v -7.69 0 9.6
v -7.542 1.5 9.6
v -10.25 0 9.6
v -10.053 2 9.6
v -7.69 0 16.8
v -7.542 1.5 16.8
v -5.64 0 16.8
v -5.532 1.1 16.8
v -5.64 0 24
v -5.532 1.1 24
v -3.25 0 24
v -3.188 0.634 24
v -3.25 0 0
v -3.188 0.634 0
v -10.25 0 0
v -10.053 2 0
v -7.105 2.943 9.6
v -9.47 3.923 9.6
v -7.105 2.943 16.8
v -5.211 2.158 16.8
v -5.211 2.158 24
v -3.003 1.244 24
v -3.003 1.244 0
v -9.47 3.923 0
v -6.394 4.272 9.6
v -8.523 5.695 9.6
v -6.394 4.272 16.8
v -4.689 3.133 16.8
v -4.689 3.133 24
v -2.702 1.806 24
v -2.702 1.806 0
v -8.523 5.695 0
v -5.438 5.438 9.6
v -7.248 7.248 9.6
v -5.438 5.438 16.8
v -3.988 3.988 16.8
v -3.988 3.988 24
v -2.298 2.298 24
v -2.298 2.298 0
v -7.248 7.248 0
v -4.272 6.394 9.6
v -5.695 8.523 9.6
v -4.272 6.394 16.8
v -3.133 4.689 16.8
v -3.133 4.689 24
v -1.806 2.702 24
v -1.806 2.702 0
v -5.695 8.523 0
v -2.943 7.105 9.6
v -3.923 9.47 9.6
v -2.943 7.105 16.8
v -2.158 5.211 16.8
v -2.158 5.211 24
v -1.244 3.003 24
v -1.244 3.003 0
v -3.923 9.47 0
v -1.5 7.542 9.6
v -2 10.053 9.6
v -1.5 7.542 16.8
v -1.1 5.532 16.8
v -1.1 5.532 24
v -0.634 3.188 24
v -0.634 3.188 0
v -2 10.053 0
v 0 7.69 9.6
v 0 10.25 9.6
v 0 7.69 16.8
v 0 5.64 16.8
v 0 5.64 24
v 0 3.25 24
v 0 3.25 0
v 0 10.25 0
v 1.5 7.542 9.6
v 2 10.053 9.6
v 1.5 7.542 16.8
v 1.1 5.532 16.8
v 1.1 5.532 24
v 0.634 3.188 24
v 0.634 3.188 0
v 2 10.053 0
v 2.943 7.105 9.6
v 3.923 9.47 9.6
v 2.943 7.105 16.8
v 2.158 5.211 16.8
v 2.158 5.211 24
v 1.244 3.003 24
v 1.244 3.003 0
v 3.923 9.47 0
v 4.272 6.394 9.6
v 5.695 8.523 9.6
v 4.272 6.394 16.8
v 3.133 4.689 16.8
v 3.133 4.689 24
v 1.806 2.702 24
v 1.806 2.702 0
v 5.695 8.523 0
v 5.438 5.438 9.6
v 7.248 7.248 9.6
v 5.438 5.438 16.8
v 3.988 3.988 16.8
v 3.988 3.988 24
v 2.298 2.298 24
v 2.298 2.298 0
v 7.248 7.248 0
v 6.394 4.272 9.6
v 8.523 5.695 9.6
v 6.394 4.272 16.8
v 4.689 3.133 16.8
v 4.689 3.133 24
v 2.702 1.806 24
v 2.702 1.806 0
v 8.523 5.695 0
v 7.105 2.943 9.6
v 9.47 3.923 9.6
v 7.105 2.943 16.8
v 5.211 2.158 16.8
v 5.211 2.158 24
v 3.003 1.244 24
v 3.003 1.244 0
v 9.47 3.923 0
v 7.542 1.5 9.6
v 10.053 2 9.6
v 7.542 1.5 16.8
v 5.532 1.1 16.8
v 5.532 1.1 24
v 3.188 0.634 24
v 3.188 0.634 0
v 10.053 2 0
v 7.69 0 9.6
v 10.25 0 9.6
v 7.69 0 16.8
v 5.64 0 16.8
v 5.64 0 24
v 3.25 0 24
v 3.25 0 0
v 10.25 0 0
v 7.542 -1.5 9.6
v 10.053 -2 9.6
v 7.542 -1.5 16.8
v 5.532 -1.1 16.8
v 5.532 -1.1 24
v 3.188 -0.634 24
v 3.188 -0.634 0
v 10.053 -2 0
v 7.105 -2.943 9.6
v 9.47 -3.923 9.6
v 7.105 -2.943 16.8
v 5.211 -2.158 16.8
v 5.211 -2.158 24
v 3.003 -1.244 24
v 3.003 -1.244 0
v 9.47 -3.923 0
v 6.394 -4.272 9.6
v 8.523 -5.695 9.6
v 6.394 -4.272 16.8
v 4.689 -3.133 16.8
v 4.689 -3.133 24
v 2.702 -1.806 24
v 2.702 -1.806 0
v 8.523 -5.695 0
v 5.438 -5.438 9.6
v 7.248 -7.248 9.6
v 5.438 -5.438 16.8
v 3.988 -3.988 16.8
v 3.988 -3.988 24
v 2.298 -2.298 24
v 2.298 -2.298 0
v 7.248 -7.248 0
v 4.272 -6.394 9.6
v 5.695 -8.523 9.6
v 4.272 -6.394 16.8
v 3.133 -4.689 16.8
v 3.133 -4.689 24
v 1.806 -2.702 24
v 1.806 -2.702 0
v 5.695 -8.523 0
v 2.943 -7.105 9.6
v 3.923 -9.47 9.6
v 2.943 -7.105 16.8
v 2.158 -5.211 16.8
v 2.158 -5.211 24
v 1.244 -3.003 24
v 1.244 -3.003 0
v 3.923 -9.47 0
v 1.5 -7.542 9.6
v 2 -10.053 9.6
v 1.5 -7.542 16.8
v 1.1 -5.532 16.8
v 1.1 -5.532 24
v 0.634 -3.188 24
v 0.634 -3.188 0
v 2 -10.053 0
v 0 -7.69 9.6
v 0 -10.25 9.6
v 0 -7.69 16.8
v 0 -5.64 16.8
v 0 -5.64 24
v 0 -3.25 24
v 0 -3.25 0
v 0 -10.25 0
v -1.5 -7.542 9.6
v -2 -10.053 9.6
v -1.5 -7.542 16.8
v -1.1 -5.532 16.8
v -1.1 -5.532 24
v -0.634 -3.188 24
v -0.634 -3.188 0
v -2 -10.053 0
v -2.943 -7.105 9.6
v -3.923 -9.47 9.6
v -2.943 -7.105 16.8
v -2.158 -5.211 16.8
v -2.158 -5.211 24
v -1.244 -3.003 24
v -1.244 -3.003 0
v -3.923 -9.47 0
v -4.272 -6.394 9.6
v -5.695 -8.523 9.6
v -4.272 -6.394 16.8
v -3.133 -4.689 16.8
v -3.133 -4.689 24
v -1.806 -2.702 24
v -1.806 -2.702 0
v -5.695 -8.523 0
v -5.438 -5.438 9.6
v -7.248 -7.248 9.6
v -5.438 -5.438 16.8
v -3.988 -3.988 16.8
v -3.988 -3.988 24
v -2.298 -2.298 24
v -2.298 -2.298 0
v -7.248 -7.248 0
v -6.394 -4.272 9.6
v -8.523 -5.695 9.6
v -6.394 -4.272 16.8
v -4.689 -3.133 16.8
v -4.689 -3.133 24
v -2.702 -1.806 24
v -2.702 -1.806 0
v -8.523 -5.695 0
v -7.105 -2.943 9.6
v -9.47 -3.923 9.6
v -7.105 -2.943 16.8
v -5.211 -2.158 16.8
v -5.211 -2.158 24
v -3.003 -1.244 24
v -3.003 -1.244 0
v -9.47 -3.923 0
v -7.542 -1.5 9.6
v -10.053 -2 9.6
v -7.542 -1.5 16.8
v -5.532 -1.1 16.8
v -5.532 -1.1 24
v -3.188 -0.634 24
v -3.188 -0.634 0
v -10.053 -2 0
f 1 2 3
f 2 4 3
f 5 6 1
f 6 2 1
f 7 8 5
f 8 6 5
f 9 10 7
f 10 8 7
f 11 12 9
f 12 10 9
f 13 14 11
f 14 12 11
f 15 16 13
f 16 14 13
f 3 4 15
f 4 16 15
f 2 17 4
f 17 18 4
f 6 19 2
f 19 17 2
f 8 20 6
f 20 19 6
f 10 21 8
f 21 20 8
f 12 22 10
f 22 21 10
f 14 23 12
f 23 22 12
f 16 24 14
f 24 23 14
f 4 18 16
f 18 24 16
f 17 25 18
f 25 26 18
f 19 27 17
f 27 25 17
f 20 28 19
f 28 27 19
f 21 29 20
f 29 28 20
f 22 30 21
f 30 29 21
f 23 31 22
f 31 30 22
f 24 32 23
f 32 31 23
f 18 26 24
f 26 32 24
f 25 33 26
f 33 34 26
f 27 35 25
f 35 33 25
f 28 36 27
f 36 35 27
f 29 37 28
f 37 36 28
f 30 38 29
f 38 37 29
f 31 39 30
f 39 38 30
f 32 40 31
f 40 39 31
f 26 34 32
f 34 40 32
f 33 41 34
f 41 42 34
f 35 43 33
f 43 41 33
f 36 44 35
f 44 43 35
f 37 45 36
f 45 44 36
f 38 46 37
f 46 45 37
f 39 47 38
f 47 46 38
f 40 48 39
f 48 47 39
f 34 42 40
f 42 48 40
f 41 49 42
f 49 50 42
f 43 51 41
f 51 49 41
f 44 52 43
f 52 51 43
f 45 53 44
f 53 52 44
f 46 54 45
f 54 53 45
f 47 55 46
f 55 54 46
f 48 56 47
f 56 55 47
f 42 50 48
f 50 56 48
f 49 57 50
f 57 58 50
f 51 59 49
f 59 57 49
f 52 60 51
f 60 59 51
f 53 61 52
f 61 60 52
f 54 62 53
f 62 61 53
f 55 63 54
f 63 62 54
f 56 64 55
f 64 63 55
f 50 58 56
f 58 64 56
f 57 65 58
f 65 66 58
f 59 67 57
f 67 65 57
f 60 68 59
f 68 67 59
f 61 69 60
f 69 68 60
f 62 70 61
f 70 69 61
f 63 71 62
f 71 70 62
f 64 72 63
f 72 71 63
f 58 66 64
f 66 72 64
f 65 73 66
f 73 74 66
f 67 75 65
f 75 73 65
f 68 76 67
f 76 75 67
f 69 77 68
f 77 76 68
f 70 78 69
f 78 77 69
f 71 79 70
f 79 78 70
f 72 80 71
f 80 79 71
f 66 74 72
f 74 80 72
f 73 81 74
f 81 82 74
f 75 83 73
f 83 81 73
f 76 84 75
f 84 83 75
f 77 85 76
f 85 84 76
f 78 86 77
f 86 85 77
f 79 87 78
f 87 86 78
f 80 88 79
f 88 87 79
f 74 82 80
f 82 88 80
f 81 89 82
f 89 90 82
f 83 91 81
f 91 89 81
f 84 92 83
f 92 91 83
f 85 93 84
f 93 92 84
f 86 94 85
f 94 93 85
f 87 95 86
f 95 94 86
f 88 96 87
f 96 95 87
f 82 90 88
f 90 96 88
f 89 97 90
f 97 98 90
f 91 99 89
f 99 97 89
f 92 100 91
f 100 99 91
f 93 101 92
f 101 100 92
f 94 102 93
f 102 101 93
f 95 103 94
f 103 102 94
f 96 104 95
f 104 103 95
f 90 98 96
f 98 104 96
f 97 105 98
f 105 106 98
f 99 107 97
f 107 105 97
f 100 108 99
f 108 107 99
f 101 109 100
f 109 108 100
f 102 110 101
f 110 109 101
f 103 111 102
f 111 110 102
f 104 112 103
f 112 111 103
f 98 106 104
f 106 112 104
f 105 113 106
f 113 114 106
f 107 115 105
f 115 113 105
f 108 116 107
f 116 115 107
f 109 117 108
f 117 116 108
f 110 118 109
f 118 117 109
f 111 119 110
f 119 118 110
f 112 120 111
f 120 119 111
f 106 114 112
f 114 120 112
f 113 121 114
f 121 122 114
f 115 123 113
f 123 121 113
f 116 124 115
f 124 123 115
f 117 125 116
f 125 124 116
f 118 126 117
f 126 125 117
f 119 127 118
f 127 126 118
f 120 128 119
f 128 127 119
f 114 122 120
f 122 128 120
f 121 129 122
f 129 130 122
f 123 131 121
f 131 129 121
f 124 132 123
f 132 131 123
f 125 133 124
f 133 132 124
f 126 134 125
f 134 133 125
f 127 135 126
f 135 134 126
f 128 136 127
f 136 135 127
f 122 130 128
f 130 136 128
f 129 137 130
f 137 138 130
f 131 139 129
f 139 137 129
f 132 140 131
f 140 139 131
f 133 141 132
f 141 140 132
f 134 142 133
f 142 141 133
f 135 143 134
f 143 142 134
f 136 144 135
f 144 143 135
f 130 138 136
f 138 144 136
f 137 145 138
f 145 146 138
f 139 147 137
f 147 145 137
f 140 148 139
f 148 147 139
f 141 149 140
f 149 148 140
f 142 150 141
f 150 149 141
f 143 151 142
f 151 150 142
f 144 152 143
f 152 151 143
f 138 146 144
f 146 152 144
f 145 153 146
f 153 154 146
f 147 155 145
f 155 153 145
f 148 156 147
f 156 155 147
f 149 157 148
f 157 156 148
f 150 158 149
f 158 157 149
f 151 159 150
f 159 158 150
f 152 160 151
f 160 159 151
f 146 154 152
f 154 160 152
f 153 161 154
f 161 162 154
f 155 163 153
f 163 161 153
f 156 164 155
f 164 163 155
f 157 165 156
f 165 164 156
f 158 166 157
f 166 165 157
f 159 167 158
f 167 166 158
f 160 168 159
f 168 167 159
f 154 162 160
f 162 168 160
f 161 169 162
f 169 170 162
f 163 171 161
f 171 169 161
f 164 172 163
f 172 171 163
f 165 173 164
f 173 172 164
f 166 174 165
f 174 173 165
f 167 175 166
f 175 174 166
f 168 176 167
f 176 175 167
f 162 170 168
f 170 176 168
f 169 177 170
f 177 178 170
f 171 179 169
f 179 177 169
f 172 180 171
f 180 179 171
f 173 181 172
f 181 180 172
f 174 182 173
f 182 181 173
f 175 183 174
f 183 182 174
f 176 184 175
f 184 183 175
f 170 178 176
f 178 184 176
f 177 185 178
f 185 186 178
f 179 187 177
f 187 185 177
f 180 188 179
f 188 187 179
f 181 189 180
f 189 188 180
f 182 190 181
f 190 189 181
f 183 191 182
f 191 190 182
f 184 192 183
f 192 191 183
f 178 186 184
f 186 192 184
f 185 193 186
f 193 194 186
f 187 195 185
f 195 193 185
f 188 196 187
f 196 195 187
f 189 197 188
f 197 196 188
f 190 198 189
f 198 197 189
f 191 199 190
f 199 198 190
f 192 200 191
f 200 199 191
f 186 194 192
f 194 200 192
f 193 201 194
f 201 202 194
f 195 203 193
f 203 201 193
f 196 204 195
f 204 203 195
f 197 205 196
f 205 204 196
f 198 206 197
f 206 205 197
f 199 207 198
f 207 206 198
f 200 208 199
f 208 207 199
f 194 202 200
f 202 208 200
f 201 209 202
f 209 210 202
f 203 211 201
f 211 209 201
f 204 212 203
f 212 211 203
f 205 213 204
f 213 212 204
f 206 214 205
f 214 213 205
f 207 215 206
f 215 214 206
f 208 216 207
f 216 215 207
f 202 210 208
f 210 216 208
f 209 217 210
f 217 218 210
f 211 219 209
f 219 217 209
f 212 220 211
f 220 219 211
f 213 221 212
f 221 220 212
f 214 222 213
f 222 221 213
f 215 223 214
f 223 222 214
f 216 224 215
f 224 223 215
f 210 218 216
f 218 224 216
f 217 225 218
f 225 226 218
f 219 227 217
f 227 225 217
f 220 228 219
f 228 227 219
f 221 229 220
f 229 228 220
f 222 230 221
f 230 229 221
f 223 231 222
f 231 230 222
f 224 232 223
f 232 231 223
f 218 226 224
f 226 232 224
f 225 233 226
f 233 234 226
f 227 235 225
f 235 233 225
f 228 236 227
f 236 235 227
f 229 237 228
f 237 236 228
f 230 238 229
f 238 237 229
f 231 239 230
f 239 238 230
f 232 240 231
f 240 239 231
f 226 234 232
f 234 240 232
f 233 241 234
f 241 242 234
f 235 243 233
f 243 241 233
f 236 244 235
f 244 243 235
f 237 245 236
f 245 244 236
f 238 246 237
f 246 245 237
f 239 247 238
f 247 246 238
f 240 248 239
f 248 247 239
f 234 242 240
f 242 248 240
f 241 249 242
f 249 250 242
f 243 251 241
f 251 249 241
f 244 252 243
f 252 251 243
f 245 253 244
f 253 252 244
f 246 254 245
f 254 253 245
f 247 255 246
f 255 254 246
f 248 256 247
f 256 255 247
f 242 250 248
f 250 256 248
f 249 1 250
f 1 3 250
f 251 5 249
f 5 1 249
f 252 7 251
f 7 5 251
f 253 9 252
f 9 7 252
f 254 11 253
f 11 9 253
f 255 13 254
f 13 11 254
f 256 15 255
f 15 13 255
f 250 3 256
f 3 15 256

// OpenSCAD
$fn = 32;

// ----------------------------------------------------------------------
// Profiled standoff: stepped spacer, 24 mm long, bore 6.5 mm
// ----------------------------------------------------------------------

// --- parameters (mm) ---
revolve_angle = 360;      // full turn around the Z axis
profile_points = 8;       // points of the closed outline

profile = [[3.25, 0], [10.25, 0], [10.25, 9.6], [7.69, 9.6], [7.69, 16.8], [5.64, 16.8], [5.64, 24], [3.25, 24]];  // single closed polygon, 8 points, counter clockwise

// --- the one profile operation ---
rotate_extrude(angle = revolve_angle) polygon(points = profile);
